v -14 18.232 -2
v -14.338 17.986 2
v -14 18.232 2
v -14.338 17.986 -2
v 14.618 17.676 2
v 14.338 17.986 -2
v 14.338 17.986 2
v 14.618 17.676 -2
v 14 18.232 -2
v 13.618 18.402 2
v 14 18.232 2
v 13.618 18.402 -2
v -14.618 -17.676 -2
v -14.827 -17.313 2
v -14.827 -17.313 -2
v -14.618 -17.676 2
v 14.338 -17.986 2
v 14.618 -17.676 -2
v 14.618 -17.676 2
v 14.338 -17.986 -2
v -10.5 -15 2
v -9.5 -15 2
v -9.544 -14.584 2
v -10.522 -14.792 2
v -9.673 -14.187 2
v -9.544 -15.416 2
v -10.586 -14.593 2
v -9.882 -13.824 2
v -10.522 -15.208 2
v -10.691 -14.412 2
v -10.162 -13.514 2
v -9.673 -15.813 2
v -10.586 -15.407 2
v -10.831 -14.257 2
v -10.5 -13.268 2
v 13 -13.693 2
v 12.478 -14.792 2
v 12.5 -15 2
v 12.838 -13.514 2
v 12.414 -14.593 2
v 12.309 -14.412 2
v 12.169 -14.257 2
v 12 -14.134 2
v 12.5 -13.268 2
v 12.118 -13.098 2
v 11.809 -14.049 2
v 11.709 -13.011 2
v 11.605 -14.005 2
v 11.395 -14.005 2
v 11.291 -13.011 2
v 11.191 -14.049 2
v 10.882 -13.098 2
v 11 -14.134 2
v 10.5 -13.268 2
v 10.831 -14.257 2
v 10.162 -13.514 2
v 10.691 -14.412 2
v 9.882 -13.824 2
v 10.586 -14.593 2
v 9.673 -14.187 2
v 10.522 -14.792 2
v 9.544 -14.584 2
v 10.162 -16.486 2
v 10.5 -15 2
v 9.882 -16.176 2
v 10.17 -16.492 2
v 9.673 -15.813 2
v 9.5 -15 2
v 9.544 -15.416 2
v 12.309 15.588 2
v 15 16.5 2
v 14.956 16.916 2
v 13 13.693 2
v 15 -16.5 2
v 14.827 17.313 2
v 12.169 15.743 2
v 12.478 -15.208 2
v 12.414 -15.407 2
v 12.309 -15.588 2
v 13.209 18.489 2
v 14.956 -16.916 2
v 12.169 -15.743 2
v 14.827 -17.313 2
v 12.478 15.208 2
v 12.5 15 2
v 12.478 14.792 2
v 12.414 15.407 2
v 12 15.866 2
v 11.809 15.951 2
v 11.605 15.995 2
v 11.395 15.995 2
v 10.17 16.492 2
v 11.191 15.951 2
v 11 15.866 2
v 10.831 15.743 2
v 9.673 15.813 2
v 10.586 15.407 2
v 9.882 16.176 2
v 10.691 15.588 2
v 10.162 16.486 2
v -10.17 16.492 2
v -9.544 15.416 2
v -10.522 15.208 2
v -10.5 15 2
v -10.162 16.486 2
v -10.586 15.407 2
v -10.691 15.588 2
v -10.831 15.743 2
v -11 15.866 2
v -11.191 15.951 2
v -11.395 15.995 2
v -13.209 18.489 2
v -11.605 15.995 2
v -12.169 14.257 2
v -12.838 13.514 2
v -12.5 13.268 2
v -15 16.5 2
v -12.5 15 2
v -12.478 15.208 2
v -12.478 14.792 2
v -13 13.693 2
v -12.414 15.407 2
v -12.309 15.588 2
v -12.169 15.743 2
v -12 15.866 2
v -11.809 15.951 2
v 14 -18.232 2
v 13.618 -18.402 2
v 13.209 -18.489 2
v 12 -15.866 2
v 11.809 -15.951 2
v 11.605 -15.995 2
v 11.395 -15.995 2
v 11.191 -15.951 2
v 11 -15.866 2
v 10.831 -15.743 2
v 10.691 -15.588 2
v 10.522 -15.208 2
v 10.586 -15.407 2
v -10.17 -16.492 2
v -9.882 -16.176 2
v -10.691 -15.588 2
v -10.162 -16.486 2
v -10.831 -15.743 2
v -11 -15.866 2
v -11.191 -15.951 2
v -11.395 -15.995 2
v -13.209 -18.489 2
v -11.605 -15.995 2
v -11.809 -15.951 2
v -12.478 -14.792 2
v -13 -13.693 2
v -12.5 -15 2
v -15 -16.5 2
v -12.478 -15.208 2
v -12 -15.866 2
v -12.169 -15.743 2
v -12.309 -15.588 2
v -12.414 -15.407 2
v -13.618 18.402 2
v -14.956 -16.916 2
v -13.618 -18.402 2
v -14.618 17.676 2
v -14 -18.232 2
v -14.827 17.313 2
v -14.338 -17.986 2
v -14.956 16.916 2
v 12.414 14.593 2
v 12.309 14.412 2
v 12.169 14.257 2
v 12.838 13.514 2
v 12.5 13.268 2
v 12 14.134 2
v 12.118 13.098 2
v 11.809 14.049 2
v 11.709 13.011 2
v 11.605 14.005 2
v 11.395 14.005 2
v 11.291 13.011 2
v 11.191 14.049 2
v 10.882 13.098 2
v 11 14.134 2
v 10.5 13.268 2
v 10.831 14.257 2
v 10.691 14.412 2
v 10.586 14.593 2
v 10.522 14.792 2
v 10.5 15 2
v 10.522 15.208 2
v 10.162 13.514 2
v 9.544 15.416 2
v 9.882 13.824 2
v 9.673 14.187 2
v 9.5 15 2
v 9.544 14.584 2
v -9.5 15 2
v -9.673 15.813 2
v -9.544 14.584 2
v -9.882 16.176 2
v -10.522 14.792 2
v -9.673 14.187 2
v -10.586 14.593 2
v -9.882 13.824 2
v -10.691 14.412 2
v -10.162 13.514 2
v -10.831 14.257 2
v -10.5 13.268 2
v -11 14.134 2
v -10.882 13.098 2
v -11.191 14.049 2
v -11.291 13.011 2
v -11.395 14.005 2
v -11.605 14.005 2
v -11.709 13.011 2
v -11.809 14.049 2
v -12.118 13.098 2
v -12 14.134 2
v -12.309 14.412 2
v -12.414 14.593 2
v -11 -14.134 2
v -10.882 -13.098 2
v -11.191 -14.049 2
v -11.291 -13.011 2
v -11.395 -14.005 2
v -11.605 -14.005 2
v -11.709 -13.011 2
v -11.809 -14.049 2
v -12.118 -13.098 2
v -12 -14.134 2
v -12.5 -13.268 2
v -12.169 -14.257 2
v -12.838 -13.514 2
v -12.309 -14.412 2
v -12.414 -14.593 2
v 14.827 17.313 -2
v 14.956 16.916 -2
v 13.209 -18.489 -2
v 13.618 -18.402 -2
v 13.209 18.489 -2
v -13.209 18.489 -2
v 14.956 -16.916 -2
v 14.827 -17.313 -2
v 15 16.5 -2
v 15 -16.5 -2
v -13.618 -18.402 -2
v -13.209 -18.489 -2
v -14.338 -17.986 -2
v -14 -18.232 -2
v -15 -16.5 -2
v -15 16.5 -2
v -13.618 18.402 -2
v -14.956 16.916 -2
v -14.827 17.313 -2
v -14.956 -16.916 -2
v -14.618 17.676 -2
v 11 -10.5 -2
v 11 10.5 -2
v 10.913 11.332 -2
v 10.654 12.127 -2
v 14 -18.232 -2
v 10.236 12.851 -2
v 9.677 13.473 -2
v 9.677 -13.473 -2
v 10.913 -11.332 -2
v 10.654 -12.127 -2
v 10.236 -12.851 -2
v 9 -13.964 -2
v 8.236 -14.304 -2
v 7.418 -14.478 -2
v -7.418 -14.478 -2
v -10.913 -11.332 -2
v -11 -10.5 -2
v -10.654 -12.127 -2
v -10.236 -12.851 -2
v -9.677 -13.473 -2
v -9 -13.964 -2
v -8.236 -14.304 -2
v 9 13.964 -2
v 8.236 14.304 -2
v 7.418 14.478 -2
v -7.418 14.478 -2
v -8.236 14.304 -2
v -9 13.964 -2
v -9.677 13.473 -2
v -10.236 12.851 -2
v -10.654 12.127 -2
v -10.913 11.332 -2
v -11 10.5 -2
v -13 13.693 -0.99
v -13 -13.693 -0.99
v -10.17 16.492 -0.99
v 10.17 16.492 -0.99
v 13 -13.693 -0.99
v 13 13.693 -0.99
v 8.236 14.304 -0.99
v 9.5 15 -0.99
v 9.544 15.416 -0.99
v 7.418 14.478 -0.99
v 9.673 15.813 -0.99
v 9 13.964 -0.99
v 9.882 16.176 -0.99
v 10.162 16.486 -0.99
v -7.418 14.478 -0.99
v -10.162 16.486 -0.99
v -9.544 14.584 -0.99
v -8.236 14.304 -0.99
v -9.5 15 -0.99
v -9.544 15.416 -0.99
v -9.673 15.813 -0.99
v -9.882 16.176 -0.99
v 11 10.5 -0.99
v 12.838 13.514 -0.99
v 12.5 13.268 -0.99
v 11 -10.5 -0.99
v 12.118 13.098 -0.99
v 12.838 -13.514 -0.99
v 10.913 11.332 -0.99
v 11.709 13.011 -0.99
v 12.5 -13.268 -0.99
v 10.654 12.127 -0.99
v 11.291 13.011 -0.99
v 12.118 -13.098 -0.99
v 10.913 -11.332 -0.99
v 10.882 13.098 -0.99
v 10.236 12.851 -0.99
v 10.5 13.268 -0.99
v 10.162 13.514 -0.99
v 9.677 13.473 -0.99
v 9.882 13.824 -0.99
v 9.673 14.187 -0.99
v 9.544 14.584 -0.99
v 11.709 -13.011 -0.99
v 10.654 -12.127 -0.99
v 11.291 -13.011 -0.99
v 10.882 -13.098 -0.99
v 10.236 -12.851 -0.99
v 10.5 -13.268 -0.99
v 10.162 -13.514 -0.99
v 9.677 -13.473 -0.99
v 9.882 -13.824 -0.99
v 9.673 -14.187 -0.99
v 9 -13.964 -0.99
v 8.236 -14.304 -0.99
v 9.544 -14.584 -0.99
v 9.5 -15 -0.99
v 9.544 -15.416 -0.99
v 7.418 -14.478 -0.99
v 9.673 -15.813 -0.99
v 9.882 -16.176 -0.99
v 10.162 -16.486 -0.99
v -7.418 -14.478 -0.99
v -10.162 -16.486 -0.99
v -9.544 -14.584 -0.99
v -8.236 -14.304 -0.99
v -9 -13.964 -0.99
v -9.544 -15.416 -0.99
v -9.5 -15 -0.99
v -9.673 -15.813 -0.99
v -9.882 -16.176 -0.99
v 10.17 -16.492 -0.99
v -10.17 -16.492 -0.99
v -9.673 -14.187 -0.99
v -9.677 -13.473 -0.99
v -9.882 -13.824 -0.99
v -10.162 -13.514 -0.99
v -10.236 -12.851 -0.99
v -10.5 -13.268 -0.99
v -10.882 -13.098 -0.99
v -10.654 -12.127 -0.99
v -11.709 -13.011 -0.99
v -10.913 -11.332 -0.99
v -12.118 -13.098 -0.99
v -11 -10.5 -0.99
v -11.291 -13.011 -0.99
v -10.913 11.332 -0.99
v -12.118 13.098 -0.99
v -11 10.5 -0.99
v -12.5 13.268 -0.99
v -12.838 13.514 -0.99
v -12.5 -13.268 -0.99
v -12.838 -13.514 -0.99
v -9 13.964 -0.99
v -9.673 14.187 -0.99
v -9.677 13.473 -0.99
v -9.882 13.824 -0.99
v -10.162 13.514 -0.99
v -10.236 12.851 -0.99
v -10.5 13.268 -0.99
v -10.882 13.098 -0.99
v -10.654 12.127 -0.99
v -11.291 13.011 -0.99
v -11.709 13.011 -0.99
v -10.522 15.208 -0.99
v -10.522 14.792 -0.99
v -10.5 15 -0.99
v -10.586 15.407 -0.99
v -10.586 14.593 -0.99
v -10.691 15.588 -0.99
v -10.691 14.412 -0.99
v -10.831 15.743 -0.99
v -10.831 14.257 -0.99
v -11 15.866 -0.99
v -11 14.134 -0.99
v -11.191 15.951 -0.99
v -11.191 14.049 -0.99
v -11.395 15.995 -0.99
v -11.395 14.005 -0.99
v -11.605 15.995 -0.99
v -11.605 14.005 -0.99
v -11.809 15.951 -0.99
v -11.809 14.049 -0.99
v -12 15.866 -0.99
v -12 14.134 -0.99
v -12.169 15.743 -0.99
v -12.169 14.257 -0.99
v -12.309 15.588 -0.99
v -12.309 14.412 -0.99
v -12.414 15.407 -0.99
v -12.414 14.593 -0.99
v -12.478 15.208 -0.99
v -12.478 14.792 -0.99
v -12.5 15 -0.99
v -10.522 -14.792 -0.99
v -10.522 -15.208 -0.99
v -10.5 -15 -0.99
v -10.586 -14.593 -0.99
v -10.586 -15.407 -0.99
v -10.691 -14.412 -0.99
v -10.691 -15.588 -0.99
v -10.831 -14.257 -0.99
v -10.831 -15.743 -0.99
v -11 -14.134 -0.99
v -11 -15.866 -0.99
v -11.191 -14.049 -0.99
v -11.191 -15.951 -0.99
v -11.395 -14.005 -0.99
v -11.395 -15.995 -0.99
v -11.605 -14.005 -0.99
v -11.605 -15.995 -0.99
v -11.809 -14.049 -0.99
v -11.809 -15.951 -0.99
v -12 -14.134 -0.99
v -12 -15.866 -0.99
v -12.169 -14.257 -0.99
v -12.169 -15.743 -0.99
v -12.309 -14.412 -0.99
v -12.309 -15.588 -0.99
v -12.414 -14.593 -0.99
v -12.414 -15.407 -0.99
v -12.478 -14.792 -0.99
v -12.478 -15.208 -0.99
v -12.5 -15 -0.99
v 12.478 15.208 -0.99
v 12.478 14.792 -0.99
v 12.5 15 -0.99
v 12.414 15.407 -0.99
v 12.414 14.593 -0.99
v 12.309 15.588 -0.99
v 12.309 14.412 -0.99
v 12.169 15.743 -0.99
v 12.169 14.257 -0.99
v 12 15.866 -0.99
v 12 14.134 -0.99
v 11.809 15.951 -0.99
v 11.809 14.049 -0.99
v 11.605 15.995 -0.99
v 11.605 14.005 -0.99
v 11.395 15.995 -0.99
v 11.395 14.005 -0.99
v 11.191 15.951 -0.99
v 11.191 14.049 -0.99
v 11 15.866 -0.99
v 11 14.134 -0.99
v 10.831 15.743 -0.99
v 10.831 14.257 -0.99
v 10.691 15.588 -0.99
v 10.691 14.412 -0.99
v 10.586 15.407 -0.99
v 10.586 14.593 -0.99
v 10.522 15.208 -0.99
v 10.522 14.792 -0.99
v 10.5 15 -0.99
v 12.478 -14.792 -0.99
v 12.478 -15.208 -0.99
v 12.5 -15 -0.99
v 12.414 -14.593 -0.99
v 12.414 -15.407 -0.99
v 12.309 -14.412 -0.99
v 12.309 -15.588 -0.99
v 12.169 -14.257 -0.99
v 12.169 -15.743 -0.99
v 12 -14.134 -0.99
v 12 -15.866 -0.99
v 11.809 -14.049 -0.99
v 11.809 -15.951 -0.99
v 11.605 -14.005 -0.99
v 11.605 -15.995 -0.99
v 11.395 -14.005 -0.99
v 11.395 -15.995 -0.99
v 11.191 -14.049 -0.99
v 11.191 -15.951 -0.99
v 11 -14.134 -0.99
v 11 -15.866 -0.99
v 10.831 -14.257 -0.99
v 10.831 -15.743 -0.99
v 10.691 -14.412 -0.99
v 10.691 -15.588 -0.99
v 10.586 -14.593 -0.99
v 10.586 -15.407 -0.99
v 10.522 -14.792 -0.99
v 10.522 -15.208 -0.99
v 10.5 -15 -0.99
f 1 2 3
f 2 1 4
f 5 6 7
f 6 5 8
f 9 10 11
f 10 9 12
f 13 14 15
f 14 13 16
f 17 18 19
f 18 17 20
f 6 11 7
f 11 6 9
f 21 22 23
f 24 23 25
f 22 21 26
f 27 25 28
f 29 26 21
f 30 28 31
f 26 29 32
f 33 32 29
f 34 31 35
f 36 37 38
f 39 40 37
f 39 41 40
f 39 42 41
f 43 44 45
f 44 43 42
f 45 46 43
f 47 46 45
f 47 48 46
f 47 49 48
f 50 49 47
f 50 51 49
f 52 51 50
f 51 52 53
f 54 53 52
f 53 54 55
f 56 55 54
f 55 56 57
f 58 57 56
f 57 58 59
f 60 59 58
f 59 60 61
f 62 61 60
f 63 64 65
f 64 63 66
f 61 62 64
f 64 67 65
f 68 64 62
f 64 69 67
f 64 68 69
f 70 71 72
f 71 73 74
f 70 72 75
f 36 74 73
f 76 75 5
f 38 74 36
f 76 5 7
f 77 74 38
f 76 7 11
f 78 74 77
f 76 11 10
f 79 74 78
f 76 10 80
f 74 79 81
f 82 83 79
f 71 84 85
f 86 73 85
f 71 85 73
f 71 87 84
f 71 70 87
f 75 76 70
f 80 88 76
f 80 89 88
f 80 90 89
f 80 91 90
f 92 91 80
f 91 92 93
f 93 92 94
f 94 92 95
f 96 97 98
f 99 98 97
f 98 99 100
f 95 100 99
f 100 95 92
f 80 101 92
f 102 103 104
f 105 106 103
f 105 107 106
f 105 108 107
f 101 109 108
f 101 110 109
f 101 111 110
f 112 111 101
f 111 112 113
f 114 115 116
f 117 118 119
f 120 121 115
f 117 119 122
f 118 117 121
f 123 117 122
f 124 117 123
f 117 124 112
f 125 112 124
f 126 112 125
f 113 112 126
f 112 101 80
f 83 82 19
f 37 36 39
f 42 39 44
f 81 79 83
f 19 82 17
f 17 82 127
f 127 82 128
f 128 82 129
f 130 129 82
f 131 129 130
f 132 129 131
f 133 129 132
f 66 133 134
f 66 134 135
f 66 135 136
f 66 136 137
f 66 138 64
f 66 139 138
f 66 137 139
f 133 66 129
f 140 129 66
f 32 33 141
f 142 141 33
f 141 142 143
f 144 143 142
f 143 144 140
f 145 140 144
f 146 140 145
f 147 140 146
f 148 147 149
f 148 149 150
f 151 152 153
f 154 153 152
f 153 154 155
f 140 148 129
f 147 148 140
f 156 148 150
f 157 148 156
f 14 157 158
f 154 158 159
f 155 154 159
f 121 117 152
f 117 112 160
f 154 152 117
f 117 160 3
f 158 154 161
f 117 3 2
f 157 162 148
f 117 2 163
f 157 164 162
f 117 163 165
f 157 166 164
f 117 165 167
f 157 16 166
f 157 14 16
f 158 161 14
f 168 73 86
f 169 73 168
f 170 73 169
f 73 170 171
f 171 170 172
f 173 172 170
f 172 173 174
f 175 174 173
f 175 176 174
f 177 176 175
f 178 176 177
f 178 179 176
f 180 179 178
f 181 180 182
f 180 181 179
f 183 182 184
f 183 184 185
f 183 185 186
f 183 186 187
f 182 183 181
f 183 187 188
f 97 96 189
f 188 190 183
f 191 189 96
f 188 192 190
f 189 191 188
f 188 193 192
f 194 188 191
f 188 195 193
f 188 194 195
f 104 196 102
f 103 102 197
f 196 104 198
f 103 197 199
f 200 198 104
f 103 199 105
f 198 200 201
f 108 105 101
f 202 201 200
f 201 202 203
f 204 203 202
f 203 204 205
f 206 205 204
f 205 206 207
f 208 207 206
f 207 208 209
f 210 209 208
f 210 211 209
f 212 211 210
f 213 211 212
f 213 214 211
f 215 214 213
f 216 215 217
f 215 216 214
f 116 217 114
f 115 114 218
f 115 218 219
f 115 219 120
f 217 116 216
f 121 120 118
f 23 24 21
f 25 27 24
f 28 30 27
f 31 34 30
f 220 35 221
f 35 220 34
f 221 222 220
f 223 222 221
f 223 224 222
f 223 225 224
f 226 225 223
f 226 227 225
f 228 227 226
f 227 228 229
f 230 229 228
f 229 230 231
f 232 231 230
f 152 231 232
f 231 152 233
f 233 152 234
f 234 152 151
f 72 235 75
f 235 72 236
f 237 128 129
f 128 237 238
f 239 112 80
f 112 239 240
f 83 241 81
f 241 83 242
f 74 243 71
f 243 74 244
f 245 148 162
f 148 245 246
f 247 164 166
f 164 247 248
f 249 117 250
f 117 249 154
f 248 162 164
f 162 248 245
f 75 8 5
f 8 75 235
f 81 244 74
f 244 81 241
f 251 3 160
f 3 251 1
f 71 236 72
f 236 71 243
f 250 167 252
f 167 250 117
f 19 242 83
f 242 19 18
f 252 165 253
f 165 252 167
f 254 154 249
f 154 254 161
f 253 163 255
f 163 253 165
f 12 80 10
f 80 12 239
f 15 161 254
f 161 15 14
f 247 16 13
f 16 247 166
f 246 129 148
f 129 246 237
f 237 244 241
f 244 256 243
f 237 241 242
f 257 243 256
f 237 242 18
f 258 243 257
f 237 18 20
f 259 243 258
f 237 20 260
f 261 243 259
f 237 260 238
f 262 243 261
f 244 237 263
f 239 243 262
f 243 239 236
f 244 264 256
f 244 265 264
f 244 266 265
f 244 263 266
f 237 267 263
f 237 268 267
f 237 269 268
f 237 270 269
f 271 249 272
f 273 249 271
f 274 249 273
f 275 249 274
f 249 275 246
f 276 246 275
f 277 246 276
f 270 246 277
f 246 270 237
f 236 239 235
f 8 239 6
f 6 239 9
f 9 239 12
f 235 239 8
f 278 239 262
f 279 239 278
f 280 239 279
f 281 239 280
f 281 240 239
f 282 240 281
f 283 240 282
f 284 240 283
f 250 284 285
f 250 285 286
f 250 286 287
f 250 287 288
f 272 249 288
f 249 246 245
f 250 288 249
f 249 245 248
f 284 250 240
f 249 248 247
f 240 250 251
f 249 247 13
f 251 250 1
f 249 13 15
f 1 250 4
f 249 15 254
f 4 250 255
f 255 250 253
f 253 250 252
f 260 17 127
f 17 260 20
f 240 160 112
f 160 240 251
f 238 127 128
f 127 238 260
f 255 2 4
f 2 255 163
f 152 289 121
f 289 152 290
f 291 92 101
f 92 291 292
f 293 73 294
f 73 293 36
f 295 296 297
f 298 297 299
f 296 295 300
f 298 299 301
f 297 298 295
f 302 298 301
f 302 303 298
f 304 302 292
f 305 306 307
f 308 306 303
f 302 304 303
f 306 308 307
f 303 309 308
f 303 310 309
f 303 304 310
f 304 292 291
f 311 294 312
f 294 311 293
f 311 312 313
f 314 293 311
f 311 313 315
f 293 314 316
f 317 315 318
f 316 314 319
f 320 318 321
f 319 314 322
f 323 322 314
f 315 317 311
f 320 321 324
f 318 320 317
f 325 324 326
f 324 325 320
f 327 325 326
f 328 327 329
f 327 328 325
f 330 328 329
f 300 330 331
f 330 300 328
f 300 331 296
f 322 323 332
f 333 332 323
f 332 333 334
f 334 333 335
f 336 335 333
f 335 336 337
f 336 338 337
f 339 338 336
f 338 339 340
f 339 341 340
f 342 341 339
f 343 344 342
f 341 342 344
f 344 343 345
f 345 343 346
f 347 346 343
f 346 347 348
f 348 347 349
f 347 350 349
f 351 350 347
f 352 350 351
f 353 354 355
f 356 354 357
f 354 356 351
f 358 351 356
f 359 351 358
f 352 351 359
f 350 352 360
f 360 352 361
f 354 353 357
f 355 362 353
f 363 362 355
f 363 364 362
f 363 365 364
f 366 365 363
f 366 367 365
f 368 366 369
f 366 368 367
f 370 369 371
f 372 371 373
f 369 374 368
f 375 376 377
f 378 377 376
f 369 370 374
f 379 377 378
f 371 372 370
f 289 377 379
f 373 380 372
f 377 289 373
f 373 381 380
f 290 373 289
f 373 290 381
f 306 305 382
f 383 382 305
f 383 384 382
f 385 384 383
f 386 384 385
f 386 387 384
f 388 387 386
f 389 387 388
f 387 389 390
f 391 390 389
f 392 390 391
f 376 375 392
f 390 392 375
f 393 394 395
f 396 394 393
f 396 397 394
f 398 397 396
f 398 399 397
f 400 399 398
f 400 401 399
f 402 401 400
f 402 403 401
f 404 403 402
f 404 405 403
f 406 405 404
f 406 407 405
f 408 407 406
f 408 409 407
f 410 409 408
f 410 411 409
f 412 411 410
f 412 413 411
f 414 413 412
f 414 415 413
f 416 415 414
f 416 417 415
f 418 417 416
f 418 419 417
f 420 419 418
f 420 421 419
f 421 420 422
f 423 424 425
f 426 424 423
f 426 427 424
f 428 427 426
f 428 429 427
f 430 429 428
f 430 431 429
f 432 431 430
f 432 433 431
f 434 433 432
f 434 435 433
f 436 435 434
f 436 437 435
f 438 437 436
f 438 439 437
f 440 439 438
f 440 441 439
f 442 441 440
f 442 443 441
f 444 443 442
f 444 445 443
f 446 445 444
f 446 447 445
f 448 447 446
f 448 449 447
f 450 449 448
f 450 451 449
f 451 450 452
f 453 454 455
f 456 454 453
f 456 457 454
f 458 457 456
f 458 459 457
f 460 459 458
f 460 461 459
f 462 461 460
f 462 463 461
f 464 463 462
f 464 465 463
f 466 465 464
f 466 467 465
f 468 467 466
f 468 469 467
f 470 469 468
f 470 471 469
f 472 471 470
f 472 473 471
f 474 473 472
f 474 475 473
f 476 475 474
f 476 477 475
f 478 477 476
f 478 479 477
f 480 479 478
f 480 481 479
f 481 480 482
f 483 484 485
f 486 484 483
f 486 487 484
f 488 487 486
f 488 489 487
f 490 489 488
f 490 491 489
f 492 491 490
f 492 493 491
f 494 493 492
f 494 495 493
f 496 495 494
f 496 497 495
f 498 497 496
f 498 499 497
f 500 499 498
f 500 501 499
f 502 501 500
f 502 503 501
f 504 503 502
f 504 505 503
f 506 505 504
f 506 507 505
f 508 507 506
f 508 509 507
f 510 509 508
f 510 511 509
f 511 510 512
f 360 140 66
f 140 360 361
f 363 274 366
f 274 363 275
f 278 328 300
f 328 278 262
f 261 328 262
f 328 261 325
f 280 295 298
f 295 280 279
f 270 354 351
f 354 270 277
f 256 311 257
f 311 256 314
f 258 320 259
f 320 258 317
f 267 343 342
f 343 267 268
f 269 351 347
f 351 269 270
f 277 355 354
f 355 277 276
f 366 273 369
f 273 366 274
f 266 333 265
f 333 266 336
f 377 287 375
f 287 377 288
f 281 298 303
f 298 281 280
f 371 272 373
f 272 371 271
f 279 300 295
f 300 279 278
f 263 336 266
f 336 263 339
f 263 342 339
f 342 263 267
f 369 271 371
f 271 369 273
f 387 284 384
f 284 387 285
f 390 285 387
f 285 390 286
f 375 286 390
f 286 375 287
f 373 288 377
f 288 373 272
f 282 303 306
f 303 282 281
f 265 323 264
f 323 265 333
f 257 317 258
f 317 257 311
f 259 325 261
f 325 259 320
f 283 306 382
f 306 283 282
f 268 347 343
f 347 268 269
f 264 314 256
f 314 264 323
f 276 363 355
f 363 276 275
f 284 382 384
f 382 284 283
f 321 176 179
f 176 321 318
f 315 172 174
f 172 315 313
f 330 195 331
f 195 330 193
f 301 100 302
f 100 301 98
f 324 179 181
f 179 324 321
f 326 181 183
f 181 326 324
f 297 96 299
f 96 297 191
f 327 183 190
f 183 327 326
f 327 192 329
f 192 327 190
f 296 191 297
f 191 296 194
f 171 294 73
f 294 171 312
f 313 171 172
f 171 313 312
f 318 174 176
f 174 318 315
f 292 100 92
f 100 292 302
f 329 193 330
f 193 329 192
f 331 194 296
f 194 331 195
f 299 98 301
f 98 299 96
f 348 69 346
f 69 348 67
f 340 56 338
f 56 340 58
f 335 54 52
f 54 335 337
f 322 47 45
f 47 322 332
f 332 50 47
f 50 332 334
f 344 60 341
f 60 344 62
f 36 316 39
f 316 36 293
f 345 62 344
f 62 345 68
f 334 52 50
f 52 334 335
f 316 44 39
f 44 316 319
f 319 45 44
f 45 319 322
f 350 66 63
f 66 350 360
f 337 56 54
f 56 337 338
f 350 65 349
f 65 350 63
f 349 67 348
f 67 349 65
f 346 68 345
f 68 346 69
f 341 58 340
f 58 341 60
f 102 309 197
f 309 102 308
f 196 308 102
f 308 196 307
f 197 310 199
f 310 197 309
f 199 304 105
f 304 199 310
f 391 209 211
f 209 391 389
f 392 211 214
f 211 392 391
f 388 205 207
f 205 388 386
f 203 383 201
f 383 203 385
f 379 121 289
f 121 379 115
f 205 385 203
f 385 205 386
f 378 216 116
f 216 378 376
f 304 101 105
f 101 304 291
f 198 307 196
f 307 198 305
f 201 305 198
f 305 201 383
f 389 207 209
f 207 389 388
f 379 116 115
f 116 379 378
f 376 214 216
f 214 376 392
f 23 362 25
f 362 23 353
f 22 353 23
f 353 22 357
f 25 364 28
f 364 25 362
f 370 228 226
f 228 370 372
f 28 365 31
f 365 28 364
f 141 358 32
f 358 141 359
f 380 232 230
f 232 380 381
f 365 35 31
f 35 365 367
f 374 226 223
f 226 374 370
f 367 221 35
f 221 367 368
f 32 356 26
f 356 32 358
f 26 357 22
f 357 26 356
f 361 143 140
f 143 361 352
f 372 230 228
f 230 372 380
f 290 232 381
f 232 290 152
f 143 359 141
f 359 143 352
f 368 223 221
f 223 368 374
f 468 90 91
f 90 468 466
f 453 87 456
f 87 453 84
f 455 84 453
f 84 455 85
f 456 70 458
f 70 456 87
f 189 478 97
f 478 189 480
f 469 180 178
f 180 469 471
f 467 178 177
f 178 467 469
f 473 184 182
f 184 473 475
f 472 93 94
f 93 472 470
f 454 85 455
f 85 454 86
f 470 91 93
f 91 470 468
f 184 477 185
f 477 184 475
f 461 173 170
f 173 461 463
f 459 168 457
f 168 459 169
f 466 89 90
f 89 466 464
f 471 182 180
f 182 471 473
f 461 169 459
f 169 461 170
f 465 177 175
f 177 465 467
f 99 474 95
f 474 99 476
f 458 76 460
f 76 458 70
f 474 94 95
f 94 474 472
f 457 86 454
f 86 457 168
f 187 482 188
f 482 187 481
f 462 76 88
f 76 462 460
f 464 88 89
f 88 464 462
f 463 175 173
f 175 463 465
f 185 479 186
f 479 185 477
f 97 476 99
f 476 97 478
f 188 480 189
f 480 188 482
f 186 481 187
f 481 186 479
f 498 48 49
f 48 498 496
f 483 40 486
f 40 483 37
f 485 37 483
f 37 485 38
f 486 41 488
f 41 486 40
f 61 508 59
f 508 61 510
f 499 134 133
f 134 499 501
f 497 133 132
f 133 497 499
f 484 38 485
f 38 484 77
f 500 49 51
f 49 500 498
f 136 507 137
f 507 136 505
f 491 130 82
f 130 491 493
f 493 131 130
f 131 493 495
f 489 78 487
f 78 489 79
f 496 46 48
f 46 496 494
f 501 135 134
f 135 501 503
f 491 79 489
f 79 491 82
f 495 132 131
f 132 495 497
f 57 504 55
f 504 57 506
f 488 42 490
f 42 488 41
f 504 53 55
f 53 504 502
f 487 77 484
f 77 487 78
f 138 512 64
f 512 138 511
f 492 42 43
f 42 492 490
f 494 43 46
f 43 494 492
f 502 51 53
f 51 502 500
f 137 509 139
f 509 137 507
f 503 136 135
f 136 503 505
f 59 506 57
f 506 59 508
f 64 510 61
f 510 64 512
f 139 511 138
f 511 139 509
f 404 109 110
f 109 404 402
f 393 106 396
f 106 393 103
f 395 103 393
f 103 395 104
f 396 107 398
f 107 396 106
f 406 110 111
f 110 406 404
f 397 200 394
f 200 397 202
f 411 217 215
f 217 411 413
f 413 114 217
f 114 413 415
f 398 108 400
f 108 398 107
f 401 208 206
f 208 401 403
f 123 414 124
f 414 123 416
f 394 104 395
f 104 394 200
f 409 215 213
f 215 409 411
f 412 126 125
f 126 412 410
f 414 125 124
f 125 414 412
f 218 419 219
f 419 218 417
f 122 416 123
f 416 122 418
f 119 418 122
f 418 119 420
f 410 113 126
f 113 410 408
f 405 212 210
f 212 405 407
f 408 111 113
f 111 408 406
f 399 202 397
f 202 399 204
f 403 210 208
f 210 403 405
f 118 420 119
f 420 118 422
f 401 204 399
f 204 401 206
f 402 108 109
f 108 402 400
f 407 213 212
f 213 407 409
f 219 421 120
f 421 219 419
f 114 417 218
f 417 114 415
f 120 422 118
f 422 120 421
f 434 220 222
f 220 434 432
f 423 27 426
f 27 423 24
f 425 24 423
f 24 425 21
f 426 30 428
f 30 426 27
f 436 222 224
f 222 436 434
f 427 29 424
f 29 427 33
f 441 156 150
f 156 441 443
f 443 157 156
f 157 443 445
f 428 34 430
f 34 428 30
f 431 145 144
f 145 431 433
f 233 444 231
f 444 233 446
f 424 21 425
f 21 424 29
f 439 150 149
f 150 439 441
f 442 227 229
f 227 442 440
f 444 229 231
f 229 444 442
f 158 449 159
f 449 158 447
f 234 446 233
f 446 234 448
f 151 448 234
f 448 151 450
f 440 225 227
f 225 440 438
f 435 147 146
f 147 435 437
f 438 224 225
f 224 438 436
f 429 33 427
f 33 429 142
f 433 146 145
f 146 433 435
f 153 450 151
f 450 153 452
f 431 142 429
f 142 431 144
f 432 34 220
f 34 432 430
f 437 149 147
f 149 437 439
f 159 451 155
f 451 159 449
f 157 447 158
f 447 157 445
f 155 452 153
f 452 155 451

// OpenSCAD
// file: ../library.scad
////////////////////////////////////////////////////////////////////////////////////////////////////
module plate4Point(x,y,z,d){
	hull(){
		color("green") translate([(x/2)-(d/2) ,(y/2) -(d/2),0]) cylinder(h=z, d=d, center=true);
		color("blue")  translate([(x/2)-(d/2) ,-(y/2)+(d/2),0]) cylinder(h=z, d=d, center=true);
		color("red")   translate([-(x/2)+(d/2),(y/2) -(d/2),0]) cylinder(h=z, d=d, center=true);
		color("grey")  translate([-(x/2)+(d/2),-(y/2)+(d/2),0]) cylinder(h=z, d=d, center=true);
	}
}
////////////////////////////////////////////////////////////////////////////////////////////////////
module plate2Point(x,z,d){
	hull(){
		color("green") translate([(x/2) -(d/2),0 ,0]) cylinder(h=z, d=d, center=true);
		color("blue")  translate([-(x/2)+(d/2),0 ,0]) cylinder(h=z, d=d, center=true);
	}
}
////////////////////////////////////////////////////////////////////////////////////////////////////
module triagleSphere(iX, iY, iZ, iD){
	
	halfD = iD/2;
	hull(){
		color("red")		translate([-halfD   , (iY/2)-halfD, halfD]) sphere(d=iD);	
		color("grey")		translate([-iX+halfD, (iY/2)-halfD, halfD]) sphere(d=iD);
		color("green")	translate([-halfD   , (iY/2)-halfD, iZ-halfD]) sphere(d=iD);

		color("red")		translate([-halfD   , -(iY/2)+halfD, halfD]) sphere(d=iD);	
		color("grey")		translate([-iX+halfD, -(iY/2)+halfD, halfD]) sphere(d=iD);
		color("green")	translate([-halfD   , -(iY/2)+halfD, iZ-halfD]) sphere(d=iD);
	}
}
////////////////////////////////////////////////////////////////////////////////////////////////////
module cubeSphere(iX, iYm, iZ, iD){

	edgeDiamitor = iD;
	
	hull(){
		for(a=[[1,1,1],[-1,1,1],[1,-1,1],[-1,-1,1],[1,1,-1],[-1,1,-1],[1,-1,-1],[-1,-1,-1]]){
			translate([
				a[0]*((iX/2) -(edgeDiamitor/2)), 
				a[1]*((iYm/2)-(edgeDiamitor/2)), 
				a[2]*((iZ/2) -(edgeDiamitor/2))]) sphere(d=edgeDiamitor);
		}
	}
} 
////////////////////////////////////////////////////////////////////////////////////////////////////
module mText(l, letter_size = 10, letter_height = 4) {
// Use linear_extrude() to make the letters 3D objects as they
// are only 2D shapes when only using text()
	font = "Bitstream Vera Sans:style=Bold" ;
	linear_extrude(height = letter_height) {
		text(l, size = letter_size, font = font, halign = "center", valign = "center", $fn = 16);
	}
}
// main file
$fn=30;

use <../library.scad>;

tinyUpsBoardWidth = 26;
tinyUpsBoardLength = 33;
tinyUpsBoardDepth = 1.66;
tinyUpsBoardCornerRadious = 3;
tinyUpsBoardCornerOffset = 1.5;
tinyUpsBoardMountHoleDiamiter = 2.85;
tinyUpsBoardMountHoleWidthOC = 22.83;
tinyUpsBoardMountHoleLengthOC = 29.78;

M2SizeT = 2.0;
M2SizeS = 2.4;

M3SizeT = 3.2;
M3SizeS = 3.5;

M4SizeT = 4.2;
M4SizeS = 4.4;


//translate([0,0,4]) tinyUpsBoard();

tinyUpsTray();

////////////////////////////////////////////////////////////////////////////////////////////////////
module tinyUpsTray(){
	difference(){
		plate4Point(tinyUpsBoardWidth+4,tinyUpsBoardLength+4,4,4);
		translate([0,0,.51]) plate4Point(tinyUpsBoardWidth,tinyUpsBoardLength,3,tinyUpsBoardMountHoleDiamiter);
		plate4Point(tinyUpsBoardWidth-4,tinyUpsBoardLength-4,6,8);
	}
	difference(){
		tinyUpsHolePoints(4,4);
		tinyUpsHolePoints(M2SizeT);
	}
}
////////////////////////////////////////////////////////////////////////////////////////////////////
module tinyUpsBoard(){
	difference(){
		plate4Point(tinyUpsBoardWidth,tinyUpsBoardLength,tinyUpsBoardDepth,tinyUpsBoardMountHoleDiamiter);
		tinyUpsHolePoints(tinyUpsBoardMountHoleDiamiter);
	}
}
////////////////////////////////////////////////////////////////////////////////////////////////////
module tinyUpsHolePoints(iDiamiter,iHeigth=10){
	
	for(a=[[1,1],[1,-1],[-1,1],[-1,-1]]){
		translate([
			a[0]*(tinyUpsBoardWidth/2)-(a[0]*tinyUpsBoardCornerOffset),
			a[1]*(tinyUpsBoardLength/2)-(a[1]*tinyUpsBoardCornerOffset),
			0]) 
			cylinder(h=iHeigth,d=iDiamiter,center=true);
	}
}
